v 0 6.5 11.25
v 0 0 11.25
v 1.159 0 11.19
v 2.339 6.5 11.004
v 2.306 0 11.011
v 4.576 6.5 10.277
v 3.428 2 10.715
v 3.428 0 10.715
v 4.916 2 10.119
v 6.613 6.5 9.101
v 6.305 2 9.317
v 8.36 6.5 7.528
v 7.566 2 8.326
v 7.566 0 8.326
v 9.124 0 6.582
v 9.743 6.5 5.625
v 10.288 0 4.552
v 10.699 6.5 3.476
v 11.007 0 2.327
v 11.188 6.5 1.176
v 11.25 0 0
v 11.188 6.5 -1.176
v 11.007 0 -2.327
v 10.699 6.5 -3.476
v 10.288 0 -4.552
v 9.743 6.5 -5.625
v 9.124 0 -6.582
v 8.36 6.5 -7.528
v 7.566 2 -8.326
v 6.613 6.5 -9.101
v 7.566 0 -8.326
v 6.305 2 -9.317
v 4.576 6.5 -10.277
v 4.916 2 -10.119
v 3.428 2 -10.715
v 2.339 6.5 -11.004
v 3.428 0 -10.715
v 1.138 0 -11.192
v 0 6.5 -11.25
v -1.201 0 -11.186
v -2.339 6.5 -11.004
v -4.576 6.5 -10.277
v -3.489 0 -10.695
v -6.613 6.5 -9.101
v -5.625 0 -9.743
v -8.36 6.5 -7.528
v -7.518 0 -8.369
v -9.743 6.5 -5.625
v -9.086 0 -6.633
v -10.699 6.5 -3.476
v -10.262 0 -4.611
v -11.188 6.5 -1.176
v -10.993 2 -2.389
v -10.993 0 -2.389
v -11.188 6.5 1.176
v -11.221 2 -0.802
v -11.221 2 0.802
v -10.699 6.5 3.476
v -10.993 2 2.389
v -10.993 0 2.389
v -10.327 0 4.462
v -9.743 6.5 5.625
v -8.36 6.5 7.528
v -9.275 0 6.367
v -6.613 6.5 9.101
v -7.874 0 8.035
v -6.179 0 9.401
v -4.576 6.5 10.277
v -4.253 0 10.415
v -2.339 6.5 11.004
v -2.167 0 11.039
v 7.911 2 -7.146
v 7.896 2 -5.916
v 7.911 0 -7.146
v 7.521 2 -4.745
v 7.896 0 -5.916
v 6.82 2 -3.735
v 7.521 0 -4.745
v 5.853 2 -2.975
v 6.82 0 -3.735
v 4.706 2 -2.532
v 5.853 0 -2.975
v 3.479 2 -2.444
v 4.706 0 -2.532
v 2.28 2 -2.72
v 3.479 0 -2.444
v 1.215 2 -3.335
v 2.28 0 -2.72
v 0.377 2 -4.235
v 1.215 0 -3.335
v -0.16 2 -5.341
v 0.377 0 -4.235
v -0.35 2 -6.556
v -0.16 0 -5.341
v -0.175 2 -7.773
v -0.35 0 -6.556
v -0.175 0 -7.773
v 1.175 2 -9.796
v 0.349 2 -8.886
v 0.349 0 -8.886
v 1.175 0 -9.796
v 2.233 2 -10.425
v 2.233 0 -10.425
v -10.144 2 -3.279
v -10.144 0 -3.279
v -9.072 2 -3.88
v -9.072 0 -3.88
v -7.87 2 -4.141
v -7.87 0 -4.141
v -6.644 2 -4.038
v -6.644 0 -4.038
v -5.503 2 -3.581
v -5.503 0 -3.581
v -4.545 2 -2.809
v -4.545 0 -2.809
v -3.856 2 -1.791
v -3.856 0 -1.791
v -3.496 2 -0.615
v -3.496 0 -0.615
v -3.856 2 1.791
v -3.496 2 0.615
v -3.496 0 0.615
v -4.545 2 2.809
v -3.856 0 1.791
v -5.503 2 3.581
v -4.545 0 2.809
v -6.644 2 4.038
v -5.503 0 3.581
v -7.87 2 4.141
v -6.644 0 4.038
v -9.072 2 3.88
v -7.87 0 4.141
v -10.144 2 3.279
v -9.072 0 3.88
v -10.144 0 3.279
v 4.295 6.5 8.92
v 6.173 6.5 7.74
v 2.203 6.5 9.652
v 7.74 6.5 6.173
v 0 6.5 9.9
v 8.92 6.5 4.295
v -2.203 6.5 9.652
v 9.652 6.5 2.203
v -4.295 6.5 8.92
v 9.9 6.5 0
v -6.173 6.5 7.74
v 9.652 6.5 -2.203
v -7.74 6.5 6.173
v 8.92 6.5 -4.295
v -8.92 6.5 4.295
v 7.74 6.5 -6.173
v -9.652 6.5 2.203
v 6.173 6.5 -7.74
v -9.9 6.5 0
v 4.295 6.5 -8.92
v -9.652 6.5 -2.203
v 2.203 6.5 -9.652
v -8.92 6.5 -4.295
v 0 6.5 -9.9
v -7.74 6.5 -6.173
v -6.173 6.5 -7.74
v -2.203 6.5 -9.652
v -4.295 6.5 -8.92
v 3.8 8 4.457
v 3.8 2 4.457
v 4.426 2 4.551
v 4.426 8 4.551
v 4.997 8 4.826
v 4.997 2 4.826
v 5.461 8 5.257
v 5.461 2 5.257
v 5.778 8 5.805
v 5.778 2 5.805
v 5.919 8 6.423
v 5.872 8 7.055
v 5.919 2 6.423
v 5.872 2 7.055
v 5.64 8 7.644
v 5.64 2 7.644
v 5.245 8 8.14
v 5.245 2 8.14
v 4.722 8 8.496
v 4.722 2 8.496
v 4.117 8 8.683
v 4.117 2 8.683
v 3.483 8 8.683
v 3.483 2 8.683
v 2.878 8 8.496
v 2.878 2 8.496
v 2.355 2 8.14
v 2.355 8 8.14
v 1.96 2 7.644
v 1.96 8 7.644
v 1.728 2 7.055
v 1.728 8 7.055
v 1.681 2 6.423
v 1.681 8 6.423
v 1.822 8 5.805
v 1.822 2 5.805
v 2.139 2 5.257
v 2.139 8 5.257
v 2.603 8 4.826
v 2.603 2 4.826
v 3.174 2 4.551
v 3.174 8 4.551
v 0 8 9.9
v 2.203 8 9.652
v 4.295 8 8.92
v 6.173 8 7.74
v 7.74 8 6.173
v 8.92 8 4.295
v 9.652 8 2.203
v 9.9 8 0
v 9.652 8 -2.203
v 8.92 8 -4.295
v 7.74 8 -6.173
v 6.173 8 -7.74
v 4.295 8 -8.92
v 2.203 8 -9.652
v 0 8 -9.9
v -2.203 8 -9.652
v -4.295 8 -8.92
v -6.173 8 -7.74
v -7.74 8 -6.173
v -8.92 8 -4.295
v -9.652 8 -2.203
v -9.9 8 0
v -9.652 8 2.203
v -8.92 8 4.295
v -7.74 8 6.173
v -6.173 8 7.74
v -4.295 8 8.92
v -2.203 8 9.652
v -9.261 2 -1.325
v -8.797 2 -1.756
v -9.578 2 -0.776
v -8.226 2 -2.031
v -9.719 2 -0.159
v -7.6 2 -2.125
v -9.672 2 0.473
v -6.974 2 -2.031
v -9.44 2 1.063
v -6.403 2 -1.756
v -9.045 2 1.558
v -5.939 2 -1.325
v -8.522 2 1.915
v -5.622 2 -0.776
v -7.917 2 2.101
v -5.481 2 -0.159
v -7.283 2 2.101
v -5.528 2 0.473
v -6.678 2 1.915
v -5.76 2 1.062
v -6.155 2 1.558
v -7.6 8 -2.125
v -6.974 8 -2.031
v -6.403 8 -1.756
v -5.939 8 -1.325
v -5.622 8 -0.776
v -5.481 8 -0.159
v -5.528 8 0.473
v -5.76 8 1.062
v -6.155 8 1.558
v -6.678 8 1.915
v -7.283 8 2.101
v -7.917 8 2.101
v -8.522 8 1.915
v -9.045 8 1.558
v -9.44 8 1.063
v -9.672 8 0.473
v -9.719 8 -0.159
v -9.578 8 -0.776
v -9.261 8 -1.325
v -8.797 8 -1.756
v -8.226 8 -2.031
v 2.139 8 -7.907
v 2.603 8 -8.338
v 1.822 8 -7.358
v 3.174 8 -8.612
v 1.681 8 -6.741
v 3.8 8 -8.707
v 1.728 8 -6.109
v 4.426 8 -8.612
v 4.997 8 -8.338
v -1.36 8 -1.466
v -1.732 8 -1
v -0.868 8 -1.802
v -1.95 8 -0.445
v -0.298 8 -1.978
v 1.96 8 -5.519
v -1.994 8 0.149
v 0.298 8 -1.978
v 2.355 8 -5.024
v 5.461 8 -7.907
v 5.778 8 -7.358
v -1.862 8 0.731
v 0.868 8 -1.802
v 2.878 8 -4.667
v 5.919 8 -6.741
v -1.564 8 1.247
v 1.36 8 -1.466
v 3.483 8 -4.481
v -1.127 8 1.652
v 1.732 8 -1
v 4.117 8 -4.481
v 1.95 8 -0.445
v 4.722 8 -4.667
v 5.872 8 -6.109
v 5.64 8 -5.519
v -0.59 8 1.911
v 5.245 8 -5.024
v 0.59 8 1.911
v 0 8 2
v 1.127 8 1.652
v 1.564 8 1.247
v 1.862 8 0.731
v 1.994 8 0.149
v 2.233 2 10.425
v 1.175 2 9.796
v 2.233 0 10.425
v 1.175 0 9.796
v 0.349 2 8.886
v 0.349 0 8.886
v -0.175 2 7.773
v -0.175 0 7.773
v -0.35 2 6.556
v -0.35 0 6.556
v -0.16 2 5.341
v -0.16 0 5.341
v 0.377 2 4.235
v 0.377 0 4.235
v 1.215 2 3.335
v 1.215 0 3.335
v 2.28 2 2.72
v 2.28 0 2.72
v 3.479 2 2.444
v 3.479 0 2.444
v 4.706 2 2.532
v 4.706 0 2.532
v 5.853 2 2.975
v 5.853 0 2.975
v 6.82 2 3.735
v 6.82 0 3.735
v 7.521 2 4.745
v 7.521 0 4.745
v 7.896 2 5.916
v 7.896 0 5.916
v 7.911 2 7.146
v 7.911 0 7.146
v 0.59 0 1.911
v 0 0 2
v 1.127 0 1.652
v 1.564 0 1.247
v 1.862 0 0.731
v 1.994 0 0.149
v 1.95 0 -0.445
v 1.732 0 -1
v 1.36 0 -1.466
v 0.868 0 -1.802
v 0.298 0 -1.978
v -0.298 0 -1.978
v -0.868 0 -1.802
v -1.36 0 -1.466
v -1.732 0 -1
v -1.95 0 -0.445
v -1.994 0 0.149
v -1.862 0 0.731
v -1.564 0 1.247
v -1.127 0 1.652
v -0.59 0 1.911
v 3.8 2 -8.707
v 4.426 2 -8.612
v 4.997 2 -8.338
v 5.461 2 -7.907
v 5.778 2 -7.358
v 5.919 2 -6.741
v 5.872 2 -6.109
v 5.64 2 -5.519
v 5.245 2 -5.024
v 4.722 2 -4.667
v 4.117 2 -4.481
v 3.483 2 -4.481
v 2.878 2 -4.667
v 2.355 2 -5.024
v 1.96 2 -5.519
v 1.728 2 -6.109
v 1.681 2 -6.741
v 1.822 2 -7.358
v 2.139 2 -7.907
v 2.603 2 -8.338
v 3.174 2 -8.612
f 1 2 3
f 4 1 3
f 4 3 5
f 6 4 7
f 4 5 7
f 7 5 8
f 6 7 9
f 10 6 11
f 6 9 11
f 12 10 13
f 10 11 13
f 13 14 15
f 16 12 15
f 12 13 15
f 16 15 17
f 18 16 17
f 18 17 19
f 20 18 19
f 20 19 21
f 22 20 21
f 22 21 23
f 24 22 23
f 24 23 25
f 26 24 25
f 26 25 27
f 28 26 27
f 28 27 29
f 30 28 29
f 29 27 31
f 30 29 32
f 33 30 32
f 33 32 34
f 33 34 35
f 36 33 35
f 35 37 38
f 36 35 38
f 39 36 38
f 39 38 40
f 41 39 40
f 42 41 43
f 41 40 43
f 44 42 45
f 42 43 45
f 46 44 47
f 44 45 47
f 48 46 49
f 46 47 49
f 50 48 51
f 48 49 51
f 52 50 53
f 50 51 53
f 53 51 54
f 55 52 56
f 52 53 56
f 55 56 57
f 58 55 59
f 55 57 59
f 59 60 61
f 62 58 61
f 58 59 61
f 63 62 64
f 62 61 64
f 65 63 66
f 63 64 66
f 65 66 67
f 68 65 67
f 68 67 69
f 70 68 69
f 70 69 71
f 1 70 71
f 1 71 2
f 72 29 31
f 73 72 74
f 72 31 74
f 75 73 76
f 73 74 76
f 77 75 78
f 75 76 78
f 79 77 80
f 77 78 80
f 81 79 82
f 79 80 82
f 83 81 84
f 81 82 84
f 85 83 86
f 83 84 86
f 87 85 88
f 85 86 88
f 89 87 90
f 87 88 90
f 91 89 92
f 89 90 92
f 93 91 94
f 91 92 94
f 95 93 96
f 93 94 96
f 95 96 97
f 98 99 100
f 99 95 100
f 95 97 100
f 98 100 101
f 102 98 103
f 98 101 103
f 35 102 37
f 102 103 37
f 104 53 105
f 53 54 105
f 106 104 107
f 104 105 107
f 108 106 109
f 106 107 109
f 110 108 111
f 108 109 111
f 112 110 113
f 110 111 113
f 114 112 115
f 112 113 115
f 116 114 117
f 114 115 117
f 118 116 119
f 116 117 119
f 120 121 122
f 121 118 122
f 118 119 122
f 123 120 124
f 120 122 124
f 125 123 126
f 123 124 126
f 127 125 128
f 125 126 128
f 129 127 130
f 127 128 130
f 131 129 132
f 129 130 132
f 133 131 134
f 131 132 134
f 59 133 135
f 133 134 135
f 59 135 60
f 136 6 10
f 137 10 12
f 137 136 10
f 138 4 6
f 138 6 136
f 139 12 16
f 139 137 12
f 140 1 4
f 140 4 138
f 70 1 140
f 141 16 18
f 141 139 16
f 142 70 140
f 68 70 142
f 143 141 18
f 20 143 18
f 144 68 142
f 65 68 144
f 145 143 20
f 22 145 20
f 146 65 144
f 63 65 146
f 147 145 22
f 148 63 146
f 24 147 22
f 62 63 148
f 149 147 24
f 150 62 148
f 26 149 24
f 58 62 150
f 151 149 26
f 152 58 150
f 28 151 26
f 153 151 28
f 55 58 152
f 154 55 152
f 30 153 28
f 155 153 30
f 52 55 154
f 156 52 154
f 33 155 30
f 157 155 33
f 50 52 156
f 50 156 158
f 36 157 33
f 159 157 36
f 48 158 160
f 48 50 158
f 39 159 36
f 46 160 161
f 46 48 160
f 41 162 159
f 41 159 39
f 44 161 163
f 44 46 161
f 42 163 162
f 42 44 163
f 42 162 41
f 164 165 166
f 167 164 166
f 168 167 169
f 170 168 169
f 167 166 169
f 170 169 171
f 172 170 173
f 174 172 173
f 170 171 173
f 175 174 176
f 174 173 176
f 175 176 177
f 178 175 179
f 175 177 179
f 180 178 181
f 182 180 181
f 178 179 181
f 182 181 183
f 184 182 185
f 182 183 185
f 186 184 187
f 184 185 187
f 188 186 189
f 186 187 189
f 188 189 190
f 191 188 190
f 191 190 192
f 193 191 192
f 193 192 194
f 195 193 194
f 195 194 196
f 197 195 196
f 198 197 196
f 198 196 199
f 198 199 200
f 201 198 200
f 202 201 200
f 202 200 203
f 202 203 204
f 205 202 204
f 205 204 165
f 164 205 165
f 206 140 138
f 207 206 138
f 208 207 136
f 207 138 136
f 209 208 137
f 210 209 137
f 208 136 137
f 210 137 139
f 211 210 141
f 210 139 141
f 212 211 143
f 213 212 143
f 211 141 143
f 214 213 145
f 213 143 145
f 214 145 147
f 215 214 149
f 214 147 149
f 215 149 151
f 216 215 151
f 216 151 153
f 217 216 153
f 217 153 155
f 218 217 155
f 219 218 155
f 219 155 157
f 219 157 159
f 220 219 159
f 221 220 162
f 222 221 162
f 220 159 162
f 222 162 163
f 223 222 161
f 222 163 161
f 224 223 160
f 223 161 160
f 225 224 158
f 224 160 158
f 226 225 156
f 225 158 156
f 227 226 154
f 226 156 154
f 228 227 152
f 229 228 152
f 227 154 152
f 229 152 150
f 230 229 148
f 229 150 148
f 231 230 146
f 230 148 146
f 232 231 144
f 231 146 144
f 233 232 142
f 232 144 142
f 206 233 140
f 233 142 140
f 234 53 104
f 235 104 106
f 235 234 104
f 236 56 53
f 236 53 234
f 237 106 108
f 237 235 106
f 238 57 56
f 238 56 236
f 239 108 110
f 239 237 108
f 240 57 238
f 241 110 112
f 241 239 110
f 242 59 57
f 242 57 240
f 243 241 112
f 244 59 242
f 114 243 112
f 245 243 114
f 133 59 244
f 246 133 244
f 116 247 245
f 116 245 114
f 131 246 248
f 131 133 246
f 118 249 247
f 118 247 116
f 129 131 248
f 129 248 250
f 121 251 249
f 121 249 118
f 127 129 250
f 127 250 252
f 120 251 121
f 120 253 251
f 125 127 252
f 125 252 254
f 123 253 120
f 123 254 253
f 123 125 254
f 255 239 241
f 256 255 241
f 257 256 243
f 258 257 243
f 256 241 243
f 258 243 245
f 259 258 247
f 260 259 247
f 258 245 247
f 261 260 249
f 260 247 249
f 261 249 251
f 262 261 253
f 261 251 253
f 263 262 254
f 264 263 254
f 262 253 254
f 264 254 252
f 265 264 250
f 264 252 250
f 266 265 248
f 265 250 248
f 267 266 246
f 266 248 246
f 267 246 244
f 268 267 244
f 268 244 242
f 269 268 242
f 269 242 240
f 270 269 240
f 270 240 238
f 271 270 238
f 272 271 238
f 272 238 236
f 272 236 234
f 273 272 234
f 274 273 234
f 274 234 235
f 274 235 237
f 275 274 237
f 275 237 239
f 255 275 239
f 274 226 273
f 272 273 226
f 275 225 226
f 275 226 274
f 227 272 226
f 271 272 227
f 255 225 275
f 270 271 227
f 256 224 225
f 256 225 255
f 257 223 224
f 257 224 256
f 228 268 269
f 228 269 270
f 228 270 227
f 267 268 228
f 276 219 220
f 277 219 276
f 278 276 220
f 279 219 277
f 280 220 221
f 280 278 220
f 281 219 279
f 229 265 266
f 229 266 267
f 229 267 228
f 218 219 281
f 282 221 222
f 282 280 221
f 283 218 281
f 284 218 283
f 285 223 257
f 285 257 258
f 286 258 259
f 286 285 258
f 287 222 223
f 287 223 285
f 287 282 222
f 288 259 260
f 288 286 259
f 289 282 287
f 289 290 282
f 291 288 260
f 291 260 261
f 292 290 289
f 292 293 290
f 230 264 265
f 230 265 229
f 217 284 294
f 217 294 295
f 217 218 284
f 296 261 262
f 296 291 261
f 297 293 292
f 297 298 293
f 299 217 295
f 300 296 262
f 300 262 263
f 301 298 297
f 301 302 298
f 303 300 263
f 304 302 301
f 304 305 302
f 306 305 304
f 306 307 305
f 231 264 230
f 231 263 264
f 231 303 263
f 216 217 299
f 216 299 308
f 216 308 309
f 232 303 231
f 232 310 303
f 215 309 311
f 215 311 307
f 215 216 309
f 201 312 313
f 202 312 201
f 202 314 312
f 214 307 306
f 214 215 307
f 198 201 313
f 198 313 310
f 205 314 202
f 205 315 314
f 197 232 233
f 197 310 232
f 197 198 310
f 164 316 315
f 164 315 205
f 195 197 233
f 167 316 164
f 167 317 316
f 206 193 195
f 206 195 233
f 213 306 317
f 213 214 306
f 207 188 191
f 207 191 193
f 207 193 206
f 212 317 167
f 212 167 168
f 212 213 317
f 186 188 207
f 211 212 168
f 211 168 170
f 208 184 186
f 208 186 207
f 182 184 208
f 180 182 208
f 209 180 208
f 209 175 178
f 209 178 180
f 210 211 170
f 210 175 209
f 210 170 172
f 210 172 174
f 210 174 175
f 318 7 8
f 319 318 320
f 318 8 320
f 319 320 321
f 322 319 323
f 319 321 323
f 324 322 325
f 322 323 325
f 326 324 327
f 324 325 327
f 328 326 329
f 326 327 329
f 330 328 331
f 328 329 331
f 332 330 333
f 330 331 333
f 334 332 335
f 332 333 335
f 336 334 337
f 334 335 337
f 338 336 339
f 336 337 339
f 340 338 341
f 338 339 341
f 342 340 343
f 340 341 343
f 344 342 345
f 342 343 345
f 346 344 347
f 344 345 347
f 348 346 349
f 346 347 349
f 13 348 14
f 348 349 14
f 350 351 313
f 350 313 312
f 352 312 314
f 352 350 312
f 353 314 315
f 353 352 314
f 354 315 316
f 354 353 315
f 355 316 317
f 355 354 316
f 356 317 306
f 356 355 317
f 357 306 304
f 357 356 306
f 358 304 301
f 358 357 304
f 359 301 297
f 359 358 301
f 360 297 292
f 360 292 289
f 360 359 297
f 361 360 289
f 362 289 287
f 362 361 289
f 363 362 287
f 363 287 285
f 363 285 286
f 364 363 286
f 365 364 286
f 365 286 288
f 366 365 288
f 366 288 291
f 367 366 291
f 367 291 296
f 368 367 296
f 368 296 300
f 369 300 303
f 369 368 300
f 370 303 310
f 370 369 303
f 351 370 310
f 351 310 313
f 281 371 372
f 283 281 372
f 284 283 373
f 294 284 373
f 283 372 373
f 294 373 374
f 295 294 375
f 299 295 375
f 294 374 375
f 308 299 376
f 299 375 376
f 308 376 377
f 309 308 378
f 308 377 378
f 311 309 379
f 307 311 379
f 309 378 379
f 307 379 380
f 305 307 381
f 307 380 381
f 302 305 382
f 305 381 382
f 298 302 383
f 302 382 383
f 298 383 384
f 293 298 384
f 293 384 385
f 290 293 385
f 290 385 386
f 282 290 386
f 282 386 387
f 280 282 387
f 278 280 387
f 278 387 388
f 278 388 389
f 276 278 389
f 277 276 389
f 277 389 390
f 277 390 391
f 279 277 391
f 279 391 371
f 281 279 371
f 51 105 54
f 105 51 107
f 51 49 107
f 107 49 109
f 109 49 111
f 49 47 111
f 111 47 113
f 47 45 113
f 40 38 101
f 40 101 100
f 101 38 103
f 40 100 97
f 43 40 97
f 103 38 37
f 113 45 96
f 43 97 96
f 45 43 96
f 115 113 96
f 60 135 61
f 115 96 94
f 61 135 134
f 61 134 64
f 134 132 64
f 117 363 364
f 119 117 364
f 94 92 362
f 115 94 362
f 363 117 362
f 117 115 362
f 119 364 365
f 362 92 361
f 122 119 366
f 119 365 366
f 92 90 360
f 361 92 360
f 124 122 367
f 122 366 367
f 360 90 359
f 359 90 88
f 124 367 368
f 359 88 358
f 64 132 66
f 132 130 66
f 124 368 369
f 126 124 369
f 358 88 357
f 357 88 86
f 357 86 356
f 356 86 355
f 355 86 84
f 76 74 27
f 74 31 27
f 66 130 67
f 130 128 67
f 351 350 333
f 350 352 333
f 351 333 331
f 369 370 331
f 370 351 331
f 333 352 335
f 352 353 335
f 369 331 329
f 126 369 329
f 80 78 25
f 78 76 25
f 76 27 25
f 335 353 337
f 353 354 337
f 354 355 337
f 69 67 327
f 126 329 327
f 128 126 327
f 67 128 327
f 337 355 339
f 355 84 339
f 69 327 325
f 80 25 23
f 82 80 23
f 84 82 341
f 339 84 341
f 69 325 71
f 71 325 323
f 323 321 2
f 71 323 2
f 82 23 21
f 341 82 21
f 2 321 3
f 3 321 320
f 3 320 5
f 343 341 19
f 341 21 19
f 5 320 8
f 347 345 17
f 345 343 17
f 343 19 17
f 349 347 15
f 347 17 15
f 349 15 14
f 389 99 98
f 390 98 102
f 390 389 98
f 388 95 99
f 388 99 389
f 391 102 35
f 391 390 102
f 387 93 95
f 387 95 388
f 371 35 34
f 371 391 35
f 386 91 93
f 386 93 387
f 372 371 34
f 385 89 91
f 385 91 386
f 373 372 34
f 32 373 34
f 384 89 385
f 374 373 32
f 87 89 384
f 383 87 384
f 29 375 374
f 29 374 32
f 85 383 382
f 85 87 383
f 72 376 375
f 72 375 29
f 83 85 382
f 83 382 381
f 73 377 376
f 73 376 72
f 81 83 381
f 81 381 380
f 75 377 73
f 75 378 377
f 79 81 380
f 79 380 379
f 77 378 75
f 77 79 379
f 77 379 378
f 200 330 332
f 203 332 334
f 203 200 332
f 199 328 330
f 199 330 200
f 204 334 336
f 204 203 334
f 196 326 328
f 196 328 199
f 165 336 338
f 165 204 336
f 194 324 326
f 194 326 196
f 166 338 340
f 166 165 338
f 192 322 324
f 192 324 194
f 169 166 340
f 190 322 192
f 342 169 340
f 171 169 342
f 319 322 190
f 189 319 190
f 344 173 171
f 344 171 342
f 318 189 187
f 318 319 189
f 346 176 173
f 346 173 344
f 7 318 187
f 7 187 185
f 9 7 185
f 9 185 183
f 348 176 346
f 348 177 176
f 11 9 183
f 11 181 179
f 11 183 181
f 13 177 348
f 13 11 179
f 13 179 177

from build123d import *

# Parameters (mm, degrees)
SKETCH1_R           = 11.25
SKETCH1_R_2         = 2
BOSS_EXTRUDE1_DEPTH = 8
SKETCH2_R           = 2.125
CUT_EXTRUDE1_DEPTH  = 18.808003819
SKETCH3_R           = 4.15
CUT_EXTRUDE2_DEPTH  = 2
CUT_EXTRUDE3_START  = -1.5
SKETCH4_R           = 11.25
SKETCH4_R_2         = 9.9
CUT_EXTRUDE3_DEPTH  = 1.5


with BuildPart() as part:
    # Sketch1 → Boss-Extrude1 (new body)
    with BuildSketch(Plane(origin=(0, 0, 0), x_dir=(1, 0, 0), z_dir=(0, 1, 0))):
        with Locations(Location((0, 0, 0), (0, 0, 270))):
            Circle(SKETCH1_R)
        with Locations(Location((0, 0, 0), (0, 0, 270))):
            Circle(SKETCH1_R_2, mode=Mode.SUBTRACT)
    extrude(amount=BOSS_EXTRUDE1_DEPTH)

    # Sketch2 → Cut-Extrude1 (cut, through all)
    with BuildSketch(Plane.XZ):
        with Locations(Location((-7.6, 0, 0), (0, 0, 270))):
            Circle(SKETCH2_R)
        with Locations(Location((3.8, 6.581793069, 0), (0, 0, 270))):
            Circle(SKETCH2_R)
        with Locations(Location((3.8, -6.581793069, 0), (0, 0, 270))):
            Circle(SKETCH2_R)
    extrude(amount=-CUT_EXTRUDE1_DEPTH, mode=Mode.SUBTRACT)

    # Sketch3 → Cut-Extrude2 (cut)
    with BuildSketch(Plane.XZ):
        with Locations((-7.6, 0)):
            Circle(SKETCH3_R)
        with Locations((3.8, 6.581793069)):
            Circle(SKETCH3_R)
        with Locations((3.8, -6.581793069)):
            Circle(SKETCH3_R)
    extrude(amount=-CUT_EXTRUDE2_DEPTH, mode=Mode.SUBTRACT)

    # Sketch4 → Cut-Extrude3 (cut)
    with BuildSketch(Plane(origin=(0, 8, 0), x_dir=(1, 0, 0), z_dir=(0, 1, 0)).offset(CUT_EXTRUDE3_START)):
        with Locations(Location((0, 0, 0), (0, 0, 72.260290628))):
            Circle(SKETCH4_R)
        with Locations(Location((0, 0, 0), (0, 0, 270))):
            Circle(SKETCH4_R_2, mode=Mode.SUBTRACT)
    extrude(amount=CUT_EXTRUDE3_DEPTH, mode=Mode.SUBTRACT)


solid = part.part
